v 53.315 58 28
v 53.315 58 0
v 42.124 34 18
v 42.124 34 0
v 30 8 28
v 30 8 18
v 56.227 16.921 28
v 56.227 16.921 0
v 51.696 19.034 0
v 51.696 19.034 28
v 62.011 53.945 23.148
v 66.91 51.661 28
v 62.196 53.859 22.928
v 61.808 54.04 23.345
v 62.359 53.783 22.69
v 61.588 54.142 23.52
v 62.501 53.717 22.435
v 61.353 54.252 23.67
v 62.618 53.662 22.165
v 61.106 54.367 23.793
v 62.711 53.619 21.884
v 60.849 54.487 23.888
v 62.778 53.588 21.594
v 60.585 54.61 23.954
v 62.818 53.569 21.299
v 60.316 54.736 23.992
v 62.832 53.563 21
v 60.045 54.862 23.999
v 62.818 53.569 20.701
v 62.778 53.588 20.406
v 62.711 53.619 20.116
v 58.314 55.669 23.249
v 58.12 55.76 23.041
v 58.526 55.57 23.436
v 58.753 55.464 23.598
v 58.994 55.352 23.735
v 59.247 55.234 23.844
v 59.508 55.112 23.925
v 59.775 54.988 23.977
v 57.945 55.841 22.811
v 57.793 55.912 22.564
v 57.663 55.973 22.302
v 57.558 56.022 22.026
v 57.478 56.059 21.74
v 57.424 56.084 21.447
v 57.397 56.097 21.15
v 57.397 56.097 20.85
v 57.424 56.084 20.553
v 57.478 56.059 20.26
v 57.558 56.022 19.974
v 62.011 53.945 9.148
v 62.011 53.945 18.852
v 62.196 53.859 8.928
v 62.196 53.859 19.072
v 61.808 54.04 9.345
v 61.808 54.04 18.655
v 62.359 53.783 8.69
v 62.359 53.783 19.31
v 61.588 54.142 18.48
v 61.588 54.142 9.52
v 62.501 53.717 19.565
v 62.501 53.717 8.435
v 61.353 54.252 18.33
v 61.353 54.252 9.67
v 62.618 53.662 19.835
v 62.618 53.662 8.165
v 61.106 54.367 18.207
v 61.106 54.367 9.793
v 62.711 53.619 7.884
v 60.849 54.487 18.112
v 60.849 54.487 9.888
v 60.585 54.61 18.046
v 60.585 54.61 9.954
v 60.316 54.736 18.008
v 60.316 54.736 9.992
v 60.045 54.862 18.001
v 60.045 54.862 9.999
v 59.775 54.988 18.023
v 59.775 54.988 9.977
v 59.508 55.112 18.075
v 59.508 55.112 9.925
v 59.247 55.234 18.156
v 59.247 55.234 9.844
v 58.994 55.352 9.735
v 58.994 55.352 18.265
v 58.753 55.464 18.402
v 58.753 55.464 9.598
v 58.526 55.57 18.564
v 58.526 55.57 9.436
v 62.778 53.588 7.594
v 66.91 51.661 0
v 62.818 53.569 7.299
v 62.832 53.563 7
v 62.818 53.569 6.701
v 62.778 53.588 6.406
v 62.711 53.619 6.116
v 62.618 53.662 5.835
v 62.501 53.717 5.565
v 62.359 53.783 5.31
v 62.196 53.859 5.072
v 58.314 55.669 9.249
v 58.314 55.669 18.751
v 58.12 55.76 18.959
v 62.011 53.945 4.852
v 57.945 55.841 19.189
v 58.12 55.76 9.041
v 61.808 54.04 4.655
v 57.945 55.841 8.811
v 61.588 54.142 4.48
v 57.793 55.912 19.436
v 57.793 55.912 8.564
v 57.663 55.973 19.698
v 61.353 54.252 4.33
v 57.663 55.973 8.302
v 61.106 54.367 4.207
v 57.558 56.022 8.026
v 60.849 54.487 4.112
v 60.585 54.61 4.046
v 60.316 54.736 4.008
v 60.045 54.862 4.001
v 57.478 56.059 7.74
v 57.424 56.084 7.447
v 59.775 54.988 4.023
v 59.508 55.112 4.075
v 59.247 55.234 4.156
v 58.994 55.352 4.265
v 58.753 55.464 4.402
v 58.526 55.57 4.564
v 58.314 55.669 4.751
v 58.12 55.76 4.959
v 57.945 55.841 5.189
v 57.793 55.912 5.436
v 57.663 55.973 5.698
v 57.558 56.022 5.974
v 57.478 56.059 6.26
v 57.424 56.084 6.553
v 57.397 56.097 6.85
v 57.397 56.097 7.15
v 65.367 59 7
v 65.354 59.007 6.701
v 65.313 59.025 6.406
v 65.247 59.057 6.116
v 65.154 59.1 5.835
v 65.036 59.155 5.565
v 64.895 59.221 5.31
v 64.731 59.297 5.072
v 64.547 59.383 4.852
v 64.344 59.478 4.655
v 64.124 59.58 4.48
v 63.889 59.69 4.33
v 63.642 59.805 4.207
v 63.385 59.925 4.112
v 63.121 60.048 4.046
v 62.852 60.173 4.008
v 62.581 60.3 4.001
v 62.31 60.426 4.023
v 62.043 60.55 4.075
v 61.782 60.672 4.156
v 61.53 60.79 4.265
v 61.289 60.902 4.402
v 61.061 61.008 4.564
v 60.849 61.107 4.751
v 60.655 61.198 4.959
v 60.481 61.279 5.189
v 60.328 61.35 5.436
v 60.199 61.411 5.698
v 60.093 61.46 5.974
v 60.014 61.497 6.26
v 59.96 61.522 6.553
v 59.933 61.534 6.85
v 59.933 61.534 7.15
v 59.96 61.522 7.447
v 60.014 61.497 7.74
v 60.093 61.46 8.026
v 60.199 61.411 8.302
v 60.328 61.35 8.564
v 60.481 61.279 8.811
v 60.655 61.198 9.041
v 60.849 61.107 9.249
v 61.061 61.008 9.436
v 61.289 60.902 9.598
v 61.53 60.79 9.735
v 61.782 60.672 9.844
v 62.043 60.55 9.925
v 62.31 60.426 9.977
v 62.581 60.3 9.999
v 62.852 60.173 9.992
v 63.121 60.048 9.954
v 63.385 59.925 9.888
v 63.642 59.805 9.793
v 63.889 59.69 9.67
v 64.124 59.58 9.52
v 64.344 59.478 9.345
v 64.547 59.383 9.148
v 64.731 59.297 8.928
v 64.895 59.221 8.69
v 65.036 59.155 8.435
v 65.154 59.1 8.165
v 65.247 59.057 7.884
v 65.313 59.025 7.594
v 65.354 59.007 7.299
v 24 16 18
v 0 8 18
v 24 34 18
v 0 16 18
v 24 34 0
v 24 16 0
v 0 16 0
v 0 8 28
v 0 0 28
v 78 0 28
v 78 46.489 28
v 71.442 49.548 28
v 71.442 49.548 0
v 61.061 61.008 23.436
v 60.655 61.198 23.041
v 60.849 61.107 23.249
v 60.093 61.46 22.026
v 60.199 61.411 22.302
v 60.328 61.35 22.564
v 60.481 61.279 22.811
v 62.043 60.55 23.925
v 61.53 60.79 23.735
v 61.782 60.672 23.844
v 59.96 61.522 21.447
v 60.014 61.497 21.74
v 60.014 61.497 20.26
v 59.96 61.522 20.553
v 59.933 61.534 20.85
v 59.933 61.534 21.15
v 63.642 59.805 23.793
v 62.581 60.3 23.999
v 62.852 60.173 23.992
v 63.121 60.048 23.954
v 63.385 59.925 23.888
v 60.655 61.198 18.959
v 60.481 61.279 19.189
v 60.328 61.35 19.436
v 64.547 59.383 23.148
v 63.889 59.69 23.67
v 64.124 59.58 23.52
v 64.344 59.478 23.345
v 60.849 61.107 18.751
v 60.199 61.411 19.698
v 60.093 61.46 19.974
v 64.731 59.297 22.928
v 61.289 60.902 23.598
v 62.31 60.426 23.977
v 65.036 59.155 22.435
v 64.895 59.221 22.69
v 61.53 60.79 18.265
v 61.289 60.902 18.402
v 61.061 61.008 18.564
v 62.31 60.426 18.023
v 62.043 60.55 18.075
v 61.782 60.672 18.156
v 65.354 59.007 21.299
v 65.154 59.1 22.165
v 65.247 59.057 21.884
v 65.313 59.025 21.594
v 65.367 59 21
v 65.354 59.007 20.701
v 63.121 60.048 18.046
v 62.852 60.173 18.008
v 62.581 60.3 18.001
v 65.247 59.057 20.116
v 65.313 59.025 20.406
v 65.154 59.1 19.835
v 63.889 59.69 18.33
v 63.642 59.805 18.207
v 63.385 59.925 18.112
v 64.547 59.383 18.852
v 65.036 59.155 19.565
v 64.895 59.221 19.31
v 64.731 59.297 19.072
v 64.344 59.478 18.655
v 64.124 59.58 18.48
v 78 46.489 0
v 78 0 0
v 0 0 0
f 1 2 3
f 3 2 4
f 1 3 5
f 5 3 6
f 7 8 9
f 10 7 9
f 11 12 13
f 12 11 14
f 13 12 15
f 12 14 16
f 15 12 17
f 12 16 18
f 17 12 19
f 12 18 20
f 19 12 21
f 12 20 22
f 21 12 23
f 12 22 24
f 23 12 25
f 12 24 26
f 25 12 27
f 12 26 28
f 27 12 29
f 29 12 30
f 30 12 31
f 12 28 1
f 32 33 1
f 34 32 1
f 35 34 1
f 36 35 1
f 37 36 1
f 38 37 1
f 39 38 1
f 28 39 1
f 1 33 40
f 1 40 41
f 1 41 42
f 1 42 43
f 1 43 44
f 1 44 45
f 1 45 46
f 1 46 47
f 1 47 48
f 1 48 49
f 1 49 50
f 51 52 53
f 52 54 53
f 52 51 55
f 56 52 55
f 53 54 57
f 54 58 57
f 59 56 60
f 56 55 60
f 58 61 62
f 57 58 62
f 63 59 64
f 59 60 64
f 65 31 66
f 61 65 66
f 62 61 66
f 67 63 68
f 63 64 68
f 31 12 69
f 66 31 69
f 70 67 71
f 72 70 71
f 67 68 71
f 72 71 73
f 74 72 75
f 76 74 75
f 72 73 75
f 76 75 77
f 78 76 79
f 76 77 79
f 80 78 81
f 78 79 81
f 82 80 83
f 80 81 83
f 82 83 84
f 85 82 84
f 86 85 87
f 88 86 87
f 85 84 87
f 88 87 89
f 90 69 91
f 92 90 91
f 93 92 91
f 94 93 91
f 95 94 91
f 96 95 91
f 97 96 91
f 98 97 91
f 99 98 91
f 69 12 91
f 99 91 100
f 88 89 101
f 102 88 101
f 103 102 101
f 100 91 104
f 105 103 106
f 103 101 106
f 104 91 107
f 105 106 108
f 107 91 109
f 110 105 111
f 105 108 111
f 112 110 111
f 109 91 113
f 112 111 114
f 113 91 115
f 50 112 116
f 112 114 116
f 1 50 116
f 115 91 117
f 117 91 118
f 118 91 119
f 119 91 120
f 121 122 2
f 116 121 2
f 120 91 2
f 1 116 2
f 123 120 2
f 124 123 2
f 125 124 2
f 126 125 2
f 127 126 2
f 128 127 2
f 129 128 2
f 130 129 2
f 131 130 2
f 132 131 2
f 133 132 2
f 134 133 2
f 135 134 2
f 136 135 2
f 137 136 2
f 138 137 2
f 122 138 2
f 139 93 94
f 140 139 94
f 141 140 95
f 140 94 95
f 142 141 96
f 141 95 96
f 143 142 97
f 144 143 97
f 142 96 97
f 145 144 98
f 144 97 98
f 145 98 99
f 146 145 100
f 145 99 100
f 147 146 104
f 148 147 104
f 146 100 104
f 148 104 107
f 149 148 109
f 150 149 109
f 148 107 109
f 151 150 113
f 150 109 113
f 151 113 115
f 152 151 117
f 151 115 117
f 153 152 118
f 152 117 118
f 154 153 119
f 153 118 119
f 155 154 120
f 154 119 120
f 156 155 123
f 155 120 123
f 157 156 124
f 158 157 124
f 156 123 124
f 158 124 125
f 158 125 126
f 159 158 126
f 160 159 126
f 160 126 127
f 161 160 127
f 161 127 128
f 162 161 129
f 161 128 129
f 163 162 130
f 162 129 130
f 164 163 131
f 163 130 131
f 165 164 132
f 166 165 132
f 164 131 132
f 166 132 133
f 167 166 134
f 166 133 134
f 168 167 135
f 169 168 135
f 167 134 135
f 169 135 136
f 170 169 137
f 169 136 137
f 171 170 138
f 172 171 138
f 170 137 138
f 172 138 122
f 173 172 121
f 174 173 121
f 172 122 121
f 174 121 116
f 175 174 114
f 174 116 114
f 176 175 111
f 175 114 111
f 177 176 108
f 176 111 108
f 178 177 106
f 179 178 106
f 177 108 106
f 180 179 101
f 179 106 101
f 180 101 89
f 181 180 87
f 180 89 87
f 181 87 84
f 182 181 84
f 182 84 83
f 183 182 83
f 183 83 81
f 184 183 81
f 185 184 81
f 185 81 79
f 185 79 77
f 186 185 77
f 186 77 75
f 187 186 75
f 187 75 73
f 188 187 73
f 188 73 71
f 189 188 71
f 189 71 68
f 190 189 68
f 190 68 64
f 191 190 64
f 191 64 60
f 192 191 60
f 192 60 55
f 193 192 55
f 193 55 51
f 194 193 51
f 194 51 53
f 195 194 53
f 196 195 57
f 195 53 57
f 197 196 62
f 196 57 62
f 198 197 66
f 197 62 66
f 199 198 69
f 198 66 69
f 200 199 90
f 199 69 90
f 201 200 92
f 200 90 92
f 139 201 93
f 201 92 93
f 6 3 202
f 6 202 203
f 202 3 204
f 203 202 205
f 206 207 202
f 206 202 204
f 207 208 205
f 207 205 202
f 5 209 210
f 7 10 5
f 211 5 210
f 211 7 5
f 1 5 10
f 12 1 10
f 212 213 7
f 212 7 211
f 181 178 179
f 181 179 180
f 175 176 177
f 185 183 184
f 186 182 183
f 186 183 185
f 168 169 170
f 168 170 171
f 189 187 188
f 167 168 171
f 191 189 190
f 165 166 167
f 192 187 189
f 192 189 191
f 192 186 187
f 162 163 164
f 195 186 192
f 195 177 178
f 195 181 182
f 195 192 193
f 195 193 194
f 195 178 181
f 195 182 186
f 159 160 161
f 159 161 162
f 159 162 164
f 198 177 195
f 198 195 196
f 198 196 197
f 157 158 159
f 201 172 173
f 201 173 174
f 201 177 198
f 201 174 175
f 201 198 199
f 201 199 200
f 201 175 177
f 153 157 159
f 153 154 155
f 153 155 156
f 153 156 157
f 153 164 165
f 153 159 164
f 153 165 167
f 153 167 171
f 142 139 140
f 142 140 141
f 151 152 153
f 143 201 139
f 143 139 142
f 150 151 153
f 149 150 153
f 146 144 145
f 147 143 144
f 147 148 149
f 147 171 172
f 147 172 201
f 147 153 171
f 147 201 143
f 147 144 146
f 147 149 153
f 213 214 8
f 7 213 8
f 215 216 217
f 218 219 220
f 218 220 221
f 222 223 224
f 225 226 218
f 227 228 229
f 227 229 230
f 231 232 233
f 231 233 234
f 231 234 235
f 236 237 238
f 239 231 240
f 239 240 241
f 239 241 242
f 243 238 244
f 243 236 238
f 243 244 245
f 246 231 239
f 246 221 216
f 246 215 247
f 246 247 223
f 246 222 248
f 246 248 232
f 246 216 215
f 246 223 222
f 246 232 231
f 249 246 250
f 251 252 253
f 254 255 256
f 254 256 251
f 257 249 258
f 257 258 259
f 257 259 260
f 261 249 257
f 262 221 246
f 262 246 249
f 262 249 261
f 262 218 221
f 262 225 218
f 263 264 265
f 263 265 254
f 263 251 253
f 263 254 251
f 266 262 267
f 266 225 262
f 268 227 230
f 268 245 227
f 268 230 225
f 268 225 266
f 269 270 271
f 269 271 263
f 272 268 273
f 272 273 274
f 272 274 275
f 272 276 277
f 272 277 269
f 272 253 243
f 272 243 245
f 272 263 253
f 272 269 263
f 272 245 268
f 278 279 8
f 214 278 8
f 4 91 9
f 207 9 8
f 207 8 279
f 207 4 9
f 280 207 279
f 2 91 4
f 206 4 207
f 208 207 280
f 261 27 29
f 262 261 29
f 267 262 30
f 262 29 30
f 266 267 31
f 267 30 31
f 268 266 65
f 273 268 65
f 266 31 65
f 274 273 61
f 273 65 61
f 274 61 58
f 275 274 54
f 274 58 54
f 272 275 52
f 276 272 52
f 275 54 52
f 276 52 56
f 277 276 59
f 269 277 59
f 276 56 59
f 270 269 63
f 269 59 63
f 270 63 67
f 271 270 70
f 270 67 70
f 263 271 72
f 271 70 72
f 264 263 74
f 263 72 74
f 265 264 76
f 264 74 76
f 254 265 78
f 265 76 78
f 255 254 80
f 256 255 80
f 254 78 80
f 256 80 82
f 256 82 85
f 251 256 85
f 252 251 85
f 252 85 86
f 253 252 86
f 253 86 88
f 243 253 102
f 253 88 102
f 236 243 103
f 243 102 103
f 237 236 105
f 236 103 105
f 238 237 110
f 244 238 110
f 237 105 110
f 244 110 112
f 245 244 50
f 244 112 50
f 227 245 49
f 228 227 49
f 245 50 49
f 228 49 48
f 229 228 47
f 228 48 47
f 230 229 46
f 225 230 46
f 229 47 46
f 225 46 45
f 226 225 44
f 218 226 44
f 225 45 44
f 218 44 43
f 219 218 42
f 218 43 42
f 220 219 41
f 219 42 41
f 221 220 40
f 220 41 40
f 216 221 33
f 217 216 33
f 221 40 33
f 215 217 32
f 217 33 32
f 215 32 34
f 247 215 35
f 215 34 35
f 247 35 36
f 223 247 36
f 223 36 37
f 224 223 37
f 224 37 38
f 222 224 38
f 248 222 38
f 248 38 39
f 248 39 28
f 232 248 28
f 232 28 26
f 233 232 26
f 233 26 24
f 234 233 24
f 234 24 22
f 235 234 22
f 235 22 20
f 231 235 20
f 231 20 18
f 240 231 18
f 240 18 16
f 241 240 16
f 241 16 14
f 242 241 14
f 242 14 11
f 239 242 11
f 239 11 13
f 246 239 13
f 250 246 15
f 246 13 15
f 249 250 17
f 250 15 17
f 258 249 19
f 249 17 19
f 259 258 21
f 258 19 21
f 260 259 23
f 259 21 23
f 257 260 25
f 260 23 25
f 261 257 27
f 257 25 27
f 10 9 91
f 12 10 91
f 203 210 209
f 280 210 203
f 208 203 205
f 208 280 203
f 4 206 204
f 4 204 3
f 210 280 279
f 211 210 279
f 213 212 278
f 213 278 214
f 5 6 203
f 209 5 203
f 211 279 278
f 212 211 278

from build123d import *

# Parameters (mm, degrees)
DODANIE_WYCI_GNI_CIE1_DEPTH = 28
SZKIC2_R                    = 3
DODANIE_WYCI_GNI_CIE2_DEPTH = 6
DODANIE_WYCI_GNI_CIE3_DEPTH = 18


with BuildPart() as part:
    # Szkic1 → Dodanie-wyciągnięcie1 (new body)
    with BuildSketch(Plane.XY):
        Polygon((0, 0), (78, 0), (78, 46.489374011), (71.441538648, 49.547634765), (56.227281226, 16.920554432), (51.695742291, 19.033645741), (66.909999713, 51.660726074), (53.315382908, 58), (30, 8), (0, 8), align=None)
    extrude(amount=DODANIE_WYCI_GNI_CIE1_DEPTH)

    # Szkic2 → Dodanie-wyciągnięcie2 (add)
    with BuildSketch(Plane(origin=(31.737746535, 68.061817086, 0), x_dir=(0.9063077870366479, -0.4226182617407039, 0), z_dir=(0.4226182617407039, 0.906307787036648, 0))):
        with Locations((31.308287517, -7)):
            Circle(SZKIC2_R)
        with Locations((31.308287517, -21)):
            Circle(SZKIC2_R)
    extrude(amount=DODANIE_WYCI_GNI_CIE2_DEPTH)

    # Szkic3 → Dodanie-wyciągnięcie3 (add)
    with BuildSketch(Plane.XY):
        Polygon((0, 8), (0, 16), (24, 16), (24, 34), (42.123999112, 34), (30, 8), align=None)
    extrude(amount=DODANIE_WYCI_GNI_CIE3_DEPTH)


solid = part.part
